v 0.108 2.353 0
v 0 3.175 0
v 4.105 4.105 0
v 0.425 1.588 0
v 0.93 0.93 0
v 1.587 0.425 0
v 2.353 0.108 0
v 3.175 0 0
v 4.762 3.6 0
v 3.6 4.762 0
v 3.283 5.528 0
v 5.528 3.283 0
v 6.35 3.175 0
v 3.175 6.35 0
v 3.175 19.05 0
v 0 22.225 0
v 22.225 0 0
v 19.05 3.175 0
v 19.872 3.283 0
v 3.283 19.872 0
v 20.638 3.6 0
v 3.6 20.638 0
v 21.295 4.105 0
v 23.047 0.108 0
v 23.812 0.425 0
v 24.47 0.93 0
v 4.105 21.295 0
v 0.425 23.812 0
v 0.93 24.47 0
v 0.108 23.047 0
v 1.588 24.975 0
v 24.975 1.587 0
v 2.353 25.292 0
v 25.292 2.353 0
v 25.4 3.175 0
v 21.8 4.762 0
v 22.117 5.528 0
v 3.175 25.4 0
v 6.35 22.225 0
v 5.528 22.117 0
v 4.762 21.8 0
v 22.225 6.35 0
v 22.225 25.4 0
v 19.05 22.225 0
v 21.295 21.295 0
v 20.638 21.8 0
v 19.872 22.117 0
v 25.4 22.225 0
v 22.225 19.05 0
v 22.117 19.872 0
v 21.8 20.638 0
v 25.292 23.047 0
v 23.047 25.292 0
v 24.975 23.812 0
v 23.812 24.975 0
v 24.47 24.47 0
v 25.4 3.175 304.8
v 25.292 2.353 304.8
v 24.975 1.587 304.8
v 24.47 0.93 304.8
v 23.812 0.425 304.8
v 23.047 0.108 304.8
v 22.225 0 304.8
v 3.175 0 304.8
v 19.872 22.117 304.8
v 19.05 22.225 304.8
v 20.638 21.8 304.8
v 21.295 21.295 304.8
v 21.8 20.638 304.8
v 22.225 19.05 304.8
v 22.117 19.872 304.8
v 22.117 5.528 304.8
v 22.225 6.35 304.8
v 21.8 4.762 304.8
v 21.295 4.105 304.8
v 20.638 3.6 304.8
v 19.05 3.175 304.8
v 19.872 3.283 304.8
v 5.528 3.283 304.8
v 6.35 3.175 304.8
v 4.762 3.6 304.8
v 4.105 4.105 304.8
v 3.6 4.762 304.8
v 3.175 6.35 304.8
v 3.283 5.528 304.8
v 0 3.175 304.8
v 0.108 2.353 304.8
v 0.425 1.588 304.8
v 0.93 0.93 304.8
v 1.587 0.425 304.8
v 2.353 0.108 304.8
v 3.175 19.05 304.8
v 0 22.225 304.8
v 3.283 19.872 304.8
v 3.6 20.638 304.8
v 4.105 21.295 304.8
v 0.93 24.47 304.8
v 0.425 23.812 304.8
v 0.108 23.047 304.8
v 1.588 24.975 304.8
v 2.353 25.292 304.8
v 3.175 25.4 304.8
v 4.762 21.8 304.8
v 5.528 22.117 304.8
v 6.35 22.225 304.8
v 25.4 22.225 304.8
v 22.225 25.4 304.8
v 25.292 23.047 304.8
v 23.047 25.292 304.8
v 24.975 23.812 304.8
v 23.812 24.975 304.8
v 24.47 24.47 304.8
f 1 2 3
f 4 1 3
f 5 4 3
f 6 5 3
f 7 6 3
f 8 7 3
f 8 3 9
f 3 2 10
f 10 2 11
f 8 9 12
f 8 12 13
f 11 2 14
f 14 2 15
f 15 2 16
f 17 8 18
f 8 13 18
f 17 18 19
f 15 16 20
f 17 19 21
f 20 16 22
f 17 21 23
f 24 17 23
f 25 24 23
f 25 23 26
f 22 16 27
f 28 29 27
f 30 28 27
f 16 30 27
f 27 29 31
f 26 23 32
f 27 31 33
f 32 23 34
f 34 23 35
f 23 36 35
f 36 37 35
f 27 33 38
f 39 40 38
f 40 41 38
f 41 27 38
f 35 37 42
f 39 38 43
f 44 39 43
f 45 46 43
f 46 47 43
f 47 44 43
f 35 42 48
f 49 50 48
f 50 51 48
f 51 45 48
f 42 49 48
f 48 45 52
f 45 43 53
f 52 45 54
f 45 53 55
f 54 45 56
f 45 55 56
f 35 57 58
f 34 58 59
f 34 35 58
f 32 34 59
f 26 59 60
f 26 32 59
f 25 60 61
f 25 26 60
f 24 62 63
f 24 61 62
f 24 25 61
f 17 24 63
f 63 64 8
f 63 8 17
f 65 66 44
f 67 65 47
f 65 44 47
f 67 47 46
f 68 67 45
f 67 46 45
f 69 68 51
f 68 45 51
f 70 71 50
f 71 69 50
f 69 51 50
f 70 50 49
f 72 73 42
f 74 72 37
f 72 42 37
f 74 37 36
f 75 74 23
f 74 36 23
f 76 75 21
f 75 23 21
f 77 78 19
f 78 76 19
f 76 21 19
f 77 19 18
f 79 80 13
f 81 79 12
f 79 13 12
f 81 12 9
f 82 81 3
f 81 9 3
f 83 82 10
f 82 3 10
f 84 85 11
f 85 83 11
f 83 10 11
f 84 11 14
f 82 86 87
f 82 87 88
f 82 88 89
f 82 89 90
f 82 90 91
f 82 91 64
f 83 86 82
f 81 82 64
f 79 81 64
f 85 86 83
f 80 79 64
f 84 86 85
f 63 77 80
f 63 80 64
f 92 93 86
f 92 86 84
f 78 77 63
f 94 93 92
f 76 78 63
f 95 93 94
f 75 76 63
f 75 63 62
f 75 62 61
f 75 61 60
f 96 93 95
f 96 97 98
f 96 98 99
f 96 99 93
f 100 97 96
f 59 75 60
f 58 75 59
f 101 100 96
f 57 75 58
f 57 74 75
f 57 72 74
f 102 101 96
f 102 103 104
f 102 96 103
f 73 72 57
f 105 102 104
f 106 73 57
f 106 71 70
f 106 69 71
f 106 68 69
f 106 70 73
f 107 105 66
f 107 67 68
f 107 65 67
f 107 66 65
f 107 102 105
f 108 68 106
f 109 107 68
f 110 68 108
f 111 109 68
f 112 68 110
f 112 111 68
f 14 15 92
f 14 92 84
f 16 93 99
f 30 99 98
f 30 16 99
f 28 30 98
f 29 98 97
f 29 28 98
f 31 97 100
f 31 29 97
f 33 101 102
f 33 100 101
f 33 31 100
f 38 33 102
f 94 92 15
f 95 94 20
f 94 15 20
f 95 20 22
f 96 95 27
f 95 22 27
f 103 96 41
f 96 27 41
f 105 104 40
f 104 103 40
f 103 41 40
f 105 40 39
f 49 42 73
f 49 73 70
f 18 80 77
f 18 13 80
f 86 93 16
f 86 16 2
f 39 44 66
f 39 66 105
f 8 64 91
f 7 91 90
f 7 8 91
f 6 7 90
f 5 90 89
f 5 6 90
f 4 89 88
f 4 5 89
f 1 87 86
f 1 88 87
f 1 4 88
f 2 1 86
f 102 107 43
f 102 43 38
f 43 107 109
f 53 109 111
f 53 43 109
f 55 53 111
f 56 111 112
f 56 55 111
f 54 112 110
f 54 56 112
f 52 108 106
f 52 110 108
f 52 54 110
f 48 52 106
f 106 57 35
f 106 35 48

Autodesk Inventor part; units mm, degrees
ref_plane "YZ Plane" through (0, 0, 0) normal (1, 0, 0) x (0, 1, 0)
ref_plane "XZ Plane" through (0, 0, 0) normal (0, 1, 0) x (-1, 0, 0)
ref_plane "XY Plane" through (0, 0, 0) normal (0, 0, 1) x (1, 0, 0)
sketch "Sketch1" plane through (0, 0, 0) normal (0, 0, 1) x (1, 0, 0)
  line L0 (3.175, 0) -> (22.225, 0)
  line L1 (25.4, 3.175) -> (25.4, 22.225)
  line L2 (22.225, 25.4) -> (3.175, 25.4)
  line L3 (0, 22.225) -> (0, 3.175)
  arc A0 (3.175, 25.4) -> (0, 22.225) centre (3.175, 22.225) ccw
  arc A1 (25.4, 22.225) -> (22.225, 25.4) centre (22.225, 22.225) ccw
  arc A2 (22.225, 0) -> (25.4, 3.175) centre (22.225, 3.175) ccw
  arc A3 (0, 3.175) -> (3.175, 0) centre (3.175, 3.175) ccw
  line L4 (6.35, 3.175) -> (19.05, 3.175)
  line L5 (22.225, 6.35) -> (22.225, 19.05)
  line L6 (19.05, 22.225) -> (6.35, 22.225)
  line L7 (3.175, 19.05) -> (3.175, 6.35)
  arc A4 (6.35, 22.225) -> (3.175, 19.05) centre (6.35, 19.05) ccw
  arc A5 (19.05, 3.175) -> (22.225, 6.35) centre (19.05, 6.35) ccw
  arc A6 (22.225, 19.05) -> (19.05, 22.225) centre (19.05, 19.05) ccw
  arc A7 (3.175, 6.35) -> (6.35, 3.175) centre (6.35, 6.35) ccw
  point P0 (0, 0)
  point P1 (25.4, 25.4)
  point P2 (25.4, 0)
  point P3 (0, 25.4)
  dimension "d0" = 25.4
  dimension "d1" = 25.4
  dimension "d2" = 3.175
  dimension "d3" = 3.175
extrude "Extrusion1" add sketch "Sketch1" along normal blind 304.8
properties part number "SteelPipe12in"
